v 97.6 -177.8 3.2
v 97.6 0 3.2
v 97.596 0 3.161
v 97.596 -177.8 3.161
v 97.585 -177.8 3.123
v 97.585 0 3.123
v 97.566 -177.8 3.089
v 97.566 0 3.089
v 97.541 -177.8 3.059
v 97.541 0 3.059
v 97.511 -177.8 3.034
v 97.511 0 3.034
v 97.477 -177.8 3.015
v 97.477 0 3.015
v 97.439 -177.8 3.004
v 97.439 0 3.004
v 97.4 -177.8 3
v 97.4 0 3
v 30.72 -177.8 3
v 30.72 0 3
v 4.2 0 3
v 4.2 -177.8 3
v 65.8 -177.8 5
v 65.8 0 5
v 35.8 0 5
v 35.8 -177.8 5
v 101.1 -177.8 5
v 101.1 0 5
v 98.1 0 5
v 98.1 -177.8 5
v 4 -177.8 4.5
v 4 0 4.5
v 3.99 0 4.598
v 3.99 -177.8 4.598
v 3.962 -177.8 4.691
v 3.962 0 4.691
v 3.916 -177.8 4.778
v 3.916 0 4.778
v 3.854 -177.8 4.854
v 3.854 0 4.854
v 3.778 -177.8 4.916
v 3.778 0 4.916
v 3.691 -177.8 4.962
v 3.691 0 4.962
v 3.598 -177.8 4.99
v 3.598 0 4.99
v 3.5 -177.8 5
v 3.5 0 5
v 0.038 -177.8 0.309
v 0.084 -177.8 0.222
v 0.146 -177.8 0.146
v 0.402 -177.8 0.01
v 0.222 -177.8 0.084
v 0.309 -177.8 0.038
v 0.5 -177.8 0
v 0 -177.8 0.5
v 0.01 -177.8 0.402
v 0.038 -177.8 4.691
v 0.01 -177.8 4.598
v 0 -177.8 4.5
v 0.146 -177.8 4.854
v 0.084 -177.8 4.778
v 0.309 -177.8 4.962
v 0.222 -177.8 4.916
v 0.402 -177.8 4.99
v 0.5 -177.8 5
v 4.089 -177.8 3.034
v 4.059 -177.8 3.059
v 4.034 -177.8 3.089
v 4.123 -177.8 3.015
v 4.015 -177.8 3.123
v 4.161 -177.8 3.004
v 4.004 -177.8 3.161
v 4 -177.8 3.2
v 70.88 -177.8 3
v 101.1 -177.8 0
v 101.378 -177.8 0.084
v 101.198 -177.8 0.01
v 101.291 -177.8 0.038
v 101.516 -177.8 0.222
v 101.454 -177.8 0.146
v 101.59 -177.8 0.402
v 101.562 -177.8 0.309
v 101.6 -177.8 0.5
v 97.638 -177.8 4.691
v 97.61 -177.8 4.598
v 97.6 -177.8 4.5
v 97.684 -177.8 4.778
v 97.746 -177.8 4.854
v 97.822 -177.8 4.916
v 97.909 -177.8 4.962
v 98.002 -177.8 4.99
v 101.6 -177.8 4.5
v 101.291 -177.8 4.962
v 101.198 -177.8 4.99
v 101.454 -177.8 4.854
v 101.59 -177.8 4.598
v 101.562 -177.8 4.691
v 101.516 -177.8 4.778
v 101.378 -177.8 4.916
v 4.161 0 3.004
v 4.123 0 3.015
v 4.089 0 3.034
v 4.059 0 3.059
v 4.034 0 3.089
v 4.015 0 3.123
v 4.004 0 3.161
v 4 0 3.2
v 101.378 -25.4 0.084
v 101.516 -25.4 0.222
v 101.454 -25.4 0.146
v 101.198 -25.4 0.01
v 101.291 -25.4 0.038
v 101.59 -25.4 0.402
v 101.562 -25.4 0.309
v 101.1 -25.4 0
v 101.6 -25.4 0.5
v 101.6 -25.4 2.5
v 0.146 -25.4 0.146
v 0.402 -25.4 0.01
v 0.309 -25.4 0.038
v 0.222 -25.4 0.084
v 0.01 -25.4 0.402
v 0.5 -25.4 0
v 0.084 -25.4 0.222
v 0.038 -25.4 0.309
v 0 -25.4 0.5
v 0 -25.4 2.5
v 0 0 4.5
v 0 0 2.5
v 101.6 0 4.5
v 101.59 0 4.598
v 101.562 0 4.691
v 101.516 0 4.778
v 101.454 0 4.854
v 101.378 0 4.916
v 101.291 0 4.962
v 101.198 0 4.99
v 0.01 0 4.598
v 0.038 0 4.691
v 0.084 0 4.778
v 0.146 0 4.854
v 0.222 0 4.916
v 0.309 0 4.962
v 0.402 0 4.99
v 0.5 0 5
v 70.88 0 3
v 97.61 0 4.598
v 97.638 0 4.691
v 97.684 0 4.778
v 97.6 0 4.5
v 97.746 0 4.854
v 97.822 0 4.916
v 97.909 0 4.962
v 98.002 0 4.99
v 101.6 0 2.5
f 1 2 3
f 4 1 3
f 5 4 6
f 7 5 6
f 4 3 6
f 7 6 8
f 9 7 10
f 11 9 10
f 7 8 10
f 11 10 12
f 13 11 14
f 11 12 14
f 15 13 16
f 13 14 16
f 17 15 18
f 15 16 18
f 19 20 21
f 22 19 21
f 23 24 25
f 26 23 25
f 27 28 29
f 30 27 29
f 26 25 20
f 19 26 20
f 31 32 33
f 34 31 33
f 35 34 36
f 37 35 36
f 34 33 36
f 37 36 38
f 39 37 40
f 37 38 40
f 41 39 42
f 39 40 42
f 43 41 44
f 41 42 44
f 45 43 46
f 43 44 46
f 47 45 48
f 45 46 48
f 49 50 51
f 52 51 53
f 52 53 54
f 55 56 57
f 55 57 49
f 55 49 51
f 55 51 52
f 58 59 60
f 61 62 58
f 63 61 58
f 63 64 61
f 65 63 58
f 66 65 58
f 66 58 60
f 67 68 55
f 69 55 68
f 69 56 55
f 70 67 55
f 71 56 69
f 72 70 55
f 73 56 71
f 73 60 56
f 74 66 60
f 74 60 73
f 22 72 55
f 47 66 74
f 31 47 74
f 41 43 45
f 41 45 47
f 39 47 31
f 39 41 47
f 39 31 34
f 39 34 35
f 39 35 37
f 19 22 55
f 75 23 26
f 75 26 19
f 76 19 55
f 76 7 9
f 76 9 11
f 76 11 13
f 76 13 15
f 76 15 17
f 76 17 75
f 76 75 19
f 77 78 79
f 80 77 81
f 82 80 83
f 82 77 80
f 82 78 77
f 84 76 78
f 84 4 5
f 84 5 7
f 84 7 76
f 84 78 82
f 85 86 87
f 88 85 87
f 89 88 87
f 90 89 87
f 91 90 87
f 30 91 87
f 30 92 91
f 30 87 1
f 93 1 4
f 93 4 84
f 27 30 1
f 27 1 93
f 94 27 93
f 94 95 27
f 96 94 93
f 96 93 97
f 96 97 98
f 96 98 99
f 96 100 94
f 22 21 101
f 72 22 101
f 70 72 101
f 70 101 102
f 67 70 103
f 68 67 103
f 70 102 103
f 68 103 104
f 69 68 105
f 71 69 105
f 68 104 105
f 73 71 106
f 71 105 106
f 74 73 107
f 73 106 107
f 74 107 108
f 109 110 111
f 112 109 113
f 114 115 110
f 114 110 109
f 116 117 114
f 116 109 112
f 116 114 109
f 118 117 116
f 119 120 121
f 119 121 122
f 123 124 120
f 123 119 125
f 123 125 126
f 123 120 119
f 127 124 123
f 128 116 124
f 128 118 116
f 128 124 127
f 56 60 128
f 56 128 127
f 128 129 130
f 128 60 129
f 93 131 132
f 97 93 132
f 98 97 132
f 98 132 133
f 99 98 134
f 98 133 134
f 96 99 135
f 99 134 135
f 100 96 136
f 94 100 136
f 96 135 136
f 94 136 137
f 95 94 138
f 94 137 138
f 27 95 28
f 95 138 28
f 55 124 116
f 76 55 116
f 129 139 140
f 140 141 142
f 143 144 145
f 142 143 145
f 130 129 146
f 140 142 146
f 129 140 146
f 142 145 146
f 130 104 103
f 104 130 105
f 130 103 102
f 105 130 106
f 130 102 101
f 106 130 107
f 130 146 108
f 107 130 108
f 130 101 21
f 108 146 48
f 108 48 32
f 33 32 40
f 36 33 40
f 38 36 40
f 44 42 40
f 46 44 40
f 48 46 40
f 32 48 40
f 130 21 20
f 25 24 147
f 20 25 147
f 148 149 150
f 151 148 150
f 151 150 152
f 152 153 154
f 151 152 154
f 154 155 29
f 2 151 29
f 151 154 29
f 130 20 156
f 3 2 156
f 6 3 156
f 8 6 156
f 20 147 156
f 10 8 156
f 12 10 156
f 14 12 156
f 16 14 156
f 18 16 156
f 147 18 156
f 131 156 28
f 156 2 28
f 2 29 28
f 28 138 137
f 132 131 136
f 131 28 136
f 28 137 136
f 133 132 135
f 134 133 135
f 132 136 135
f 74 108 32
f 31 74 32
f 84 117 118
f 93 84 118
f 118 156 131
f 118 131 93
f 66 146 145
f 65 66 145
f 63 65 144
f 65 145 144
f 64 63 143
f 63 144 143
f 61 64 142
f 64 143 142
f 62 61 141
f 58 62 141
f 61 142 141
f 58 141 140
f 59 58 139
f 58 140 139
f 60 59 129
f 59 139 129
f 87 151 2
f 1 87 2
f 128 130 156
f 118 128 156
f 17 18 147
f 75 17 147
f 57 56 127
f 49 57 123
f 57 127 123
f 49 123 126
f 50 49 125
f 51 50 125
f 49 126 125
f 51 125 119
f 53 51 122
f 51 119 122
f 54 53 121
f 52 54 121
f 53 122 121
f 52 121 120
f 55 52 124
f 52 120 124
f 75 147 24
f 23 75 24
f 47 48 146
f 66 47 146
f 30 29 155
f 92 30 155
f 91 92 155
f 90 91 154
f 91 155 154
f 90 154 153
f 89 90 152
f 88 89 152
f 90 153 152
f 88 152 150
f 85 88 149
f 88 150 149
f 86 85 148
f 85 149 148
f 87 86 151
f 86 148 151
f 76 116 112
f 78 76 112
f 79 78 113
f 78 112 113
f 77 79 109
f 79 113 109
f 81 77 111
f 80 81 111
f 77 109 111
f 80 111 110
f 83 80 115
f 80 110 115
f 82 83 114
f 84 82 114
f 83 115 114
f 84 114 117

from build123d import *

# Parameters (mm, degrees)
F1_DEPTH = 177.8
F3_DEPTH = 25.4


with BuildPart() as f1:
    # F0 (on Front) → F1 (new body)
    with BuildSketch(Plane.XZ):
        with BuildLine():
            ThreePointArc((0, 0.5), (0.146447, 0.146447), (0.5, 0))
            Line((0.5, 0), (101.1, 0))
            ThreePointArc((101.1, 0), (101.453553, 0.146447), (101.6, 0.5))
            Line((101.6, 0.5), (101.6, 4.5))
            ThreePointArc((101.6, 4.5), (101.453553, 4.853553), (101.1, 5))
            Line((101.1, 5), (98.1, 5))
            ThreePointArc((98.1, 5), (97.746447, 4.853553), (97.6, 4.5))
            Line((97.6, 4.5), (97.6, 3.2))
            ThreePointArc((97.6, 3.2), (97.541421, 3.058579), (97.4, 3))
            Line((97.4, 3), (70.88, 3))
            Line((70.88, 3), (65.8, 5))
            Line((65.8, 5), (35.8, 5))
            Line((35.8, 5), (30.72, 3))
            Line((30.72, 3), (4.2, 3))
            ThreePointArc((4.2, 3), (4.058579, 3.058579), (4, 3.2))
            Line((4, 3.2), (4, 4.5))
            ThreePointArc((4, 4.5), (3.853553, 4.853553), (3.5, 5))
            Line((3.5, 5), (0.5, 5))
            ThreePointArc((0.5, 5), (0.146447, 4.853553), (0, 4.5))
            Line((0, 4.5), (0, 0.5))
        make_face()
    extrude(amount=F1_DEPTH)

    # F2 (on face) → F3 (cut)
    with BuildSketch(Plane(origin=(0, 0, 0), x_dir=(-1, 0, 0), z_dir=(0, 1, 0))):
        with BuildLine():
            Line((0, 2.5), (-101.6, 2.5))
            Line((-101.6, 2.5), (-101.6, 0.5))
            ThreePointArc((-101.6, 0.5), (-101.453553, 0.146447), (-101.1, 0))
            Line((-101.1, 0), (-0.5, 0))
            ThreePointArc((-0.5, 0), (-0.146447, 0.146447), (0, 0.5))
            Line((0, 0.5), (0, 2.5))
        make_face()
    extrude(amount=-F3_DEPTH, mode=Mode.SUBTRACT)


solid = f1.part
